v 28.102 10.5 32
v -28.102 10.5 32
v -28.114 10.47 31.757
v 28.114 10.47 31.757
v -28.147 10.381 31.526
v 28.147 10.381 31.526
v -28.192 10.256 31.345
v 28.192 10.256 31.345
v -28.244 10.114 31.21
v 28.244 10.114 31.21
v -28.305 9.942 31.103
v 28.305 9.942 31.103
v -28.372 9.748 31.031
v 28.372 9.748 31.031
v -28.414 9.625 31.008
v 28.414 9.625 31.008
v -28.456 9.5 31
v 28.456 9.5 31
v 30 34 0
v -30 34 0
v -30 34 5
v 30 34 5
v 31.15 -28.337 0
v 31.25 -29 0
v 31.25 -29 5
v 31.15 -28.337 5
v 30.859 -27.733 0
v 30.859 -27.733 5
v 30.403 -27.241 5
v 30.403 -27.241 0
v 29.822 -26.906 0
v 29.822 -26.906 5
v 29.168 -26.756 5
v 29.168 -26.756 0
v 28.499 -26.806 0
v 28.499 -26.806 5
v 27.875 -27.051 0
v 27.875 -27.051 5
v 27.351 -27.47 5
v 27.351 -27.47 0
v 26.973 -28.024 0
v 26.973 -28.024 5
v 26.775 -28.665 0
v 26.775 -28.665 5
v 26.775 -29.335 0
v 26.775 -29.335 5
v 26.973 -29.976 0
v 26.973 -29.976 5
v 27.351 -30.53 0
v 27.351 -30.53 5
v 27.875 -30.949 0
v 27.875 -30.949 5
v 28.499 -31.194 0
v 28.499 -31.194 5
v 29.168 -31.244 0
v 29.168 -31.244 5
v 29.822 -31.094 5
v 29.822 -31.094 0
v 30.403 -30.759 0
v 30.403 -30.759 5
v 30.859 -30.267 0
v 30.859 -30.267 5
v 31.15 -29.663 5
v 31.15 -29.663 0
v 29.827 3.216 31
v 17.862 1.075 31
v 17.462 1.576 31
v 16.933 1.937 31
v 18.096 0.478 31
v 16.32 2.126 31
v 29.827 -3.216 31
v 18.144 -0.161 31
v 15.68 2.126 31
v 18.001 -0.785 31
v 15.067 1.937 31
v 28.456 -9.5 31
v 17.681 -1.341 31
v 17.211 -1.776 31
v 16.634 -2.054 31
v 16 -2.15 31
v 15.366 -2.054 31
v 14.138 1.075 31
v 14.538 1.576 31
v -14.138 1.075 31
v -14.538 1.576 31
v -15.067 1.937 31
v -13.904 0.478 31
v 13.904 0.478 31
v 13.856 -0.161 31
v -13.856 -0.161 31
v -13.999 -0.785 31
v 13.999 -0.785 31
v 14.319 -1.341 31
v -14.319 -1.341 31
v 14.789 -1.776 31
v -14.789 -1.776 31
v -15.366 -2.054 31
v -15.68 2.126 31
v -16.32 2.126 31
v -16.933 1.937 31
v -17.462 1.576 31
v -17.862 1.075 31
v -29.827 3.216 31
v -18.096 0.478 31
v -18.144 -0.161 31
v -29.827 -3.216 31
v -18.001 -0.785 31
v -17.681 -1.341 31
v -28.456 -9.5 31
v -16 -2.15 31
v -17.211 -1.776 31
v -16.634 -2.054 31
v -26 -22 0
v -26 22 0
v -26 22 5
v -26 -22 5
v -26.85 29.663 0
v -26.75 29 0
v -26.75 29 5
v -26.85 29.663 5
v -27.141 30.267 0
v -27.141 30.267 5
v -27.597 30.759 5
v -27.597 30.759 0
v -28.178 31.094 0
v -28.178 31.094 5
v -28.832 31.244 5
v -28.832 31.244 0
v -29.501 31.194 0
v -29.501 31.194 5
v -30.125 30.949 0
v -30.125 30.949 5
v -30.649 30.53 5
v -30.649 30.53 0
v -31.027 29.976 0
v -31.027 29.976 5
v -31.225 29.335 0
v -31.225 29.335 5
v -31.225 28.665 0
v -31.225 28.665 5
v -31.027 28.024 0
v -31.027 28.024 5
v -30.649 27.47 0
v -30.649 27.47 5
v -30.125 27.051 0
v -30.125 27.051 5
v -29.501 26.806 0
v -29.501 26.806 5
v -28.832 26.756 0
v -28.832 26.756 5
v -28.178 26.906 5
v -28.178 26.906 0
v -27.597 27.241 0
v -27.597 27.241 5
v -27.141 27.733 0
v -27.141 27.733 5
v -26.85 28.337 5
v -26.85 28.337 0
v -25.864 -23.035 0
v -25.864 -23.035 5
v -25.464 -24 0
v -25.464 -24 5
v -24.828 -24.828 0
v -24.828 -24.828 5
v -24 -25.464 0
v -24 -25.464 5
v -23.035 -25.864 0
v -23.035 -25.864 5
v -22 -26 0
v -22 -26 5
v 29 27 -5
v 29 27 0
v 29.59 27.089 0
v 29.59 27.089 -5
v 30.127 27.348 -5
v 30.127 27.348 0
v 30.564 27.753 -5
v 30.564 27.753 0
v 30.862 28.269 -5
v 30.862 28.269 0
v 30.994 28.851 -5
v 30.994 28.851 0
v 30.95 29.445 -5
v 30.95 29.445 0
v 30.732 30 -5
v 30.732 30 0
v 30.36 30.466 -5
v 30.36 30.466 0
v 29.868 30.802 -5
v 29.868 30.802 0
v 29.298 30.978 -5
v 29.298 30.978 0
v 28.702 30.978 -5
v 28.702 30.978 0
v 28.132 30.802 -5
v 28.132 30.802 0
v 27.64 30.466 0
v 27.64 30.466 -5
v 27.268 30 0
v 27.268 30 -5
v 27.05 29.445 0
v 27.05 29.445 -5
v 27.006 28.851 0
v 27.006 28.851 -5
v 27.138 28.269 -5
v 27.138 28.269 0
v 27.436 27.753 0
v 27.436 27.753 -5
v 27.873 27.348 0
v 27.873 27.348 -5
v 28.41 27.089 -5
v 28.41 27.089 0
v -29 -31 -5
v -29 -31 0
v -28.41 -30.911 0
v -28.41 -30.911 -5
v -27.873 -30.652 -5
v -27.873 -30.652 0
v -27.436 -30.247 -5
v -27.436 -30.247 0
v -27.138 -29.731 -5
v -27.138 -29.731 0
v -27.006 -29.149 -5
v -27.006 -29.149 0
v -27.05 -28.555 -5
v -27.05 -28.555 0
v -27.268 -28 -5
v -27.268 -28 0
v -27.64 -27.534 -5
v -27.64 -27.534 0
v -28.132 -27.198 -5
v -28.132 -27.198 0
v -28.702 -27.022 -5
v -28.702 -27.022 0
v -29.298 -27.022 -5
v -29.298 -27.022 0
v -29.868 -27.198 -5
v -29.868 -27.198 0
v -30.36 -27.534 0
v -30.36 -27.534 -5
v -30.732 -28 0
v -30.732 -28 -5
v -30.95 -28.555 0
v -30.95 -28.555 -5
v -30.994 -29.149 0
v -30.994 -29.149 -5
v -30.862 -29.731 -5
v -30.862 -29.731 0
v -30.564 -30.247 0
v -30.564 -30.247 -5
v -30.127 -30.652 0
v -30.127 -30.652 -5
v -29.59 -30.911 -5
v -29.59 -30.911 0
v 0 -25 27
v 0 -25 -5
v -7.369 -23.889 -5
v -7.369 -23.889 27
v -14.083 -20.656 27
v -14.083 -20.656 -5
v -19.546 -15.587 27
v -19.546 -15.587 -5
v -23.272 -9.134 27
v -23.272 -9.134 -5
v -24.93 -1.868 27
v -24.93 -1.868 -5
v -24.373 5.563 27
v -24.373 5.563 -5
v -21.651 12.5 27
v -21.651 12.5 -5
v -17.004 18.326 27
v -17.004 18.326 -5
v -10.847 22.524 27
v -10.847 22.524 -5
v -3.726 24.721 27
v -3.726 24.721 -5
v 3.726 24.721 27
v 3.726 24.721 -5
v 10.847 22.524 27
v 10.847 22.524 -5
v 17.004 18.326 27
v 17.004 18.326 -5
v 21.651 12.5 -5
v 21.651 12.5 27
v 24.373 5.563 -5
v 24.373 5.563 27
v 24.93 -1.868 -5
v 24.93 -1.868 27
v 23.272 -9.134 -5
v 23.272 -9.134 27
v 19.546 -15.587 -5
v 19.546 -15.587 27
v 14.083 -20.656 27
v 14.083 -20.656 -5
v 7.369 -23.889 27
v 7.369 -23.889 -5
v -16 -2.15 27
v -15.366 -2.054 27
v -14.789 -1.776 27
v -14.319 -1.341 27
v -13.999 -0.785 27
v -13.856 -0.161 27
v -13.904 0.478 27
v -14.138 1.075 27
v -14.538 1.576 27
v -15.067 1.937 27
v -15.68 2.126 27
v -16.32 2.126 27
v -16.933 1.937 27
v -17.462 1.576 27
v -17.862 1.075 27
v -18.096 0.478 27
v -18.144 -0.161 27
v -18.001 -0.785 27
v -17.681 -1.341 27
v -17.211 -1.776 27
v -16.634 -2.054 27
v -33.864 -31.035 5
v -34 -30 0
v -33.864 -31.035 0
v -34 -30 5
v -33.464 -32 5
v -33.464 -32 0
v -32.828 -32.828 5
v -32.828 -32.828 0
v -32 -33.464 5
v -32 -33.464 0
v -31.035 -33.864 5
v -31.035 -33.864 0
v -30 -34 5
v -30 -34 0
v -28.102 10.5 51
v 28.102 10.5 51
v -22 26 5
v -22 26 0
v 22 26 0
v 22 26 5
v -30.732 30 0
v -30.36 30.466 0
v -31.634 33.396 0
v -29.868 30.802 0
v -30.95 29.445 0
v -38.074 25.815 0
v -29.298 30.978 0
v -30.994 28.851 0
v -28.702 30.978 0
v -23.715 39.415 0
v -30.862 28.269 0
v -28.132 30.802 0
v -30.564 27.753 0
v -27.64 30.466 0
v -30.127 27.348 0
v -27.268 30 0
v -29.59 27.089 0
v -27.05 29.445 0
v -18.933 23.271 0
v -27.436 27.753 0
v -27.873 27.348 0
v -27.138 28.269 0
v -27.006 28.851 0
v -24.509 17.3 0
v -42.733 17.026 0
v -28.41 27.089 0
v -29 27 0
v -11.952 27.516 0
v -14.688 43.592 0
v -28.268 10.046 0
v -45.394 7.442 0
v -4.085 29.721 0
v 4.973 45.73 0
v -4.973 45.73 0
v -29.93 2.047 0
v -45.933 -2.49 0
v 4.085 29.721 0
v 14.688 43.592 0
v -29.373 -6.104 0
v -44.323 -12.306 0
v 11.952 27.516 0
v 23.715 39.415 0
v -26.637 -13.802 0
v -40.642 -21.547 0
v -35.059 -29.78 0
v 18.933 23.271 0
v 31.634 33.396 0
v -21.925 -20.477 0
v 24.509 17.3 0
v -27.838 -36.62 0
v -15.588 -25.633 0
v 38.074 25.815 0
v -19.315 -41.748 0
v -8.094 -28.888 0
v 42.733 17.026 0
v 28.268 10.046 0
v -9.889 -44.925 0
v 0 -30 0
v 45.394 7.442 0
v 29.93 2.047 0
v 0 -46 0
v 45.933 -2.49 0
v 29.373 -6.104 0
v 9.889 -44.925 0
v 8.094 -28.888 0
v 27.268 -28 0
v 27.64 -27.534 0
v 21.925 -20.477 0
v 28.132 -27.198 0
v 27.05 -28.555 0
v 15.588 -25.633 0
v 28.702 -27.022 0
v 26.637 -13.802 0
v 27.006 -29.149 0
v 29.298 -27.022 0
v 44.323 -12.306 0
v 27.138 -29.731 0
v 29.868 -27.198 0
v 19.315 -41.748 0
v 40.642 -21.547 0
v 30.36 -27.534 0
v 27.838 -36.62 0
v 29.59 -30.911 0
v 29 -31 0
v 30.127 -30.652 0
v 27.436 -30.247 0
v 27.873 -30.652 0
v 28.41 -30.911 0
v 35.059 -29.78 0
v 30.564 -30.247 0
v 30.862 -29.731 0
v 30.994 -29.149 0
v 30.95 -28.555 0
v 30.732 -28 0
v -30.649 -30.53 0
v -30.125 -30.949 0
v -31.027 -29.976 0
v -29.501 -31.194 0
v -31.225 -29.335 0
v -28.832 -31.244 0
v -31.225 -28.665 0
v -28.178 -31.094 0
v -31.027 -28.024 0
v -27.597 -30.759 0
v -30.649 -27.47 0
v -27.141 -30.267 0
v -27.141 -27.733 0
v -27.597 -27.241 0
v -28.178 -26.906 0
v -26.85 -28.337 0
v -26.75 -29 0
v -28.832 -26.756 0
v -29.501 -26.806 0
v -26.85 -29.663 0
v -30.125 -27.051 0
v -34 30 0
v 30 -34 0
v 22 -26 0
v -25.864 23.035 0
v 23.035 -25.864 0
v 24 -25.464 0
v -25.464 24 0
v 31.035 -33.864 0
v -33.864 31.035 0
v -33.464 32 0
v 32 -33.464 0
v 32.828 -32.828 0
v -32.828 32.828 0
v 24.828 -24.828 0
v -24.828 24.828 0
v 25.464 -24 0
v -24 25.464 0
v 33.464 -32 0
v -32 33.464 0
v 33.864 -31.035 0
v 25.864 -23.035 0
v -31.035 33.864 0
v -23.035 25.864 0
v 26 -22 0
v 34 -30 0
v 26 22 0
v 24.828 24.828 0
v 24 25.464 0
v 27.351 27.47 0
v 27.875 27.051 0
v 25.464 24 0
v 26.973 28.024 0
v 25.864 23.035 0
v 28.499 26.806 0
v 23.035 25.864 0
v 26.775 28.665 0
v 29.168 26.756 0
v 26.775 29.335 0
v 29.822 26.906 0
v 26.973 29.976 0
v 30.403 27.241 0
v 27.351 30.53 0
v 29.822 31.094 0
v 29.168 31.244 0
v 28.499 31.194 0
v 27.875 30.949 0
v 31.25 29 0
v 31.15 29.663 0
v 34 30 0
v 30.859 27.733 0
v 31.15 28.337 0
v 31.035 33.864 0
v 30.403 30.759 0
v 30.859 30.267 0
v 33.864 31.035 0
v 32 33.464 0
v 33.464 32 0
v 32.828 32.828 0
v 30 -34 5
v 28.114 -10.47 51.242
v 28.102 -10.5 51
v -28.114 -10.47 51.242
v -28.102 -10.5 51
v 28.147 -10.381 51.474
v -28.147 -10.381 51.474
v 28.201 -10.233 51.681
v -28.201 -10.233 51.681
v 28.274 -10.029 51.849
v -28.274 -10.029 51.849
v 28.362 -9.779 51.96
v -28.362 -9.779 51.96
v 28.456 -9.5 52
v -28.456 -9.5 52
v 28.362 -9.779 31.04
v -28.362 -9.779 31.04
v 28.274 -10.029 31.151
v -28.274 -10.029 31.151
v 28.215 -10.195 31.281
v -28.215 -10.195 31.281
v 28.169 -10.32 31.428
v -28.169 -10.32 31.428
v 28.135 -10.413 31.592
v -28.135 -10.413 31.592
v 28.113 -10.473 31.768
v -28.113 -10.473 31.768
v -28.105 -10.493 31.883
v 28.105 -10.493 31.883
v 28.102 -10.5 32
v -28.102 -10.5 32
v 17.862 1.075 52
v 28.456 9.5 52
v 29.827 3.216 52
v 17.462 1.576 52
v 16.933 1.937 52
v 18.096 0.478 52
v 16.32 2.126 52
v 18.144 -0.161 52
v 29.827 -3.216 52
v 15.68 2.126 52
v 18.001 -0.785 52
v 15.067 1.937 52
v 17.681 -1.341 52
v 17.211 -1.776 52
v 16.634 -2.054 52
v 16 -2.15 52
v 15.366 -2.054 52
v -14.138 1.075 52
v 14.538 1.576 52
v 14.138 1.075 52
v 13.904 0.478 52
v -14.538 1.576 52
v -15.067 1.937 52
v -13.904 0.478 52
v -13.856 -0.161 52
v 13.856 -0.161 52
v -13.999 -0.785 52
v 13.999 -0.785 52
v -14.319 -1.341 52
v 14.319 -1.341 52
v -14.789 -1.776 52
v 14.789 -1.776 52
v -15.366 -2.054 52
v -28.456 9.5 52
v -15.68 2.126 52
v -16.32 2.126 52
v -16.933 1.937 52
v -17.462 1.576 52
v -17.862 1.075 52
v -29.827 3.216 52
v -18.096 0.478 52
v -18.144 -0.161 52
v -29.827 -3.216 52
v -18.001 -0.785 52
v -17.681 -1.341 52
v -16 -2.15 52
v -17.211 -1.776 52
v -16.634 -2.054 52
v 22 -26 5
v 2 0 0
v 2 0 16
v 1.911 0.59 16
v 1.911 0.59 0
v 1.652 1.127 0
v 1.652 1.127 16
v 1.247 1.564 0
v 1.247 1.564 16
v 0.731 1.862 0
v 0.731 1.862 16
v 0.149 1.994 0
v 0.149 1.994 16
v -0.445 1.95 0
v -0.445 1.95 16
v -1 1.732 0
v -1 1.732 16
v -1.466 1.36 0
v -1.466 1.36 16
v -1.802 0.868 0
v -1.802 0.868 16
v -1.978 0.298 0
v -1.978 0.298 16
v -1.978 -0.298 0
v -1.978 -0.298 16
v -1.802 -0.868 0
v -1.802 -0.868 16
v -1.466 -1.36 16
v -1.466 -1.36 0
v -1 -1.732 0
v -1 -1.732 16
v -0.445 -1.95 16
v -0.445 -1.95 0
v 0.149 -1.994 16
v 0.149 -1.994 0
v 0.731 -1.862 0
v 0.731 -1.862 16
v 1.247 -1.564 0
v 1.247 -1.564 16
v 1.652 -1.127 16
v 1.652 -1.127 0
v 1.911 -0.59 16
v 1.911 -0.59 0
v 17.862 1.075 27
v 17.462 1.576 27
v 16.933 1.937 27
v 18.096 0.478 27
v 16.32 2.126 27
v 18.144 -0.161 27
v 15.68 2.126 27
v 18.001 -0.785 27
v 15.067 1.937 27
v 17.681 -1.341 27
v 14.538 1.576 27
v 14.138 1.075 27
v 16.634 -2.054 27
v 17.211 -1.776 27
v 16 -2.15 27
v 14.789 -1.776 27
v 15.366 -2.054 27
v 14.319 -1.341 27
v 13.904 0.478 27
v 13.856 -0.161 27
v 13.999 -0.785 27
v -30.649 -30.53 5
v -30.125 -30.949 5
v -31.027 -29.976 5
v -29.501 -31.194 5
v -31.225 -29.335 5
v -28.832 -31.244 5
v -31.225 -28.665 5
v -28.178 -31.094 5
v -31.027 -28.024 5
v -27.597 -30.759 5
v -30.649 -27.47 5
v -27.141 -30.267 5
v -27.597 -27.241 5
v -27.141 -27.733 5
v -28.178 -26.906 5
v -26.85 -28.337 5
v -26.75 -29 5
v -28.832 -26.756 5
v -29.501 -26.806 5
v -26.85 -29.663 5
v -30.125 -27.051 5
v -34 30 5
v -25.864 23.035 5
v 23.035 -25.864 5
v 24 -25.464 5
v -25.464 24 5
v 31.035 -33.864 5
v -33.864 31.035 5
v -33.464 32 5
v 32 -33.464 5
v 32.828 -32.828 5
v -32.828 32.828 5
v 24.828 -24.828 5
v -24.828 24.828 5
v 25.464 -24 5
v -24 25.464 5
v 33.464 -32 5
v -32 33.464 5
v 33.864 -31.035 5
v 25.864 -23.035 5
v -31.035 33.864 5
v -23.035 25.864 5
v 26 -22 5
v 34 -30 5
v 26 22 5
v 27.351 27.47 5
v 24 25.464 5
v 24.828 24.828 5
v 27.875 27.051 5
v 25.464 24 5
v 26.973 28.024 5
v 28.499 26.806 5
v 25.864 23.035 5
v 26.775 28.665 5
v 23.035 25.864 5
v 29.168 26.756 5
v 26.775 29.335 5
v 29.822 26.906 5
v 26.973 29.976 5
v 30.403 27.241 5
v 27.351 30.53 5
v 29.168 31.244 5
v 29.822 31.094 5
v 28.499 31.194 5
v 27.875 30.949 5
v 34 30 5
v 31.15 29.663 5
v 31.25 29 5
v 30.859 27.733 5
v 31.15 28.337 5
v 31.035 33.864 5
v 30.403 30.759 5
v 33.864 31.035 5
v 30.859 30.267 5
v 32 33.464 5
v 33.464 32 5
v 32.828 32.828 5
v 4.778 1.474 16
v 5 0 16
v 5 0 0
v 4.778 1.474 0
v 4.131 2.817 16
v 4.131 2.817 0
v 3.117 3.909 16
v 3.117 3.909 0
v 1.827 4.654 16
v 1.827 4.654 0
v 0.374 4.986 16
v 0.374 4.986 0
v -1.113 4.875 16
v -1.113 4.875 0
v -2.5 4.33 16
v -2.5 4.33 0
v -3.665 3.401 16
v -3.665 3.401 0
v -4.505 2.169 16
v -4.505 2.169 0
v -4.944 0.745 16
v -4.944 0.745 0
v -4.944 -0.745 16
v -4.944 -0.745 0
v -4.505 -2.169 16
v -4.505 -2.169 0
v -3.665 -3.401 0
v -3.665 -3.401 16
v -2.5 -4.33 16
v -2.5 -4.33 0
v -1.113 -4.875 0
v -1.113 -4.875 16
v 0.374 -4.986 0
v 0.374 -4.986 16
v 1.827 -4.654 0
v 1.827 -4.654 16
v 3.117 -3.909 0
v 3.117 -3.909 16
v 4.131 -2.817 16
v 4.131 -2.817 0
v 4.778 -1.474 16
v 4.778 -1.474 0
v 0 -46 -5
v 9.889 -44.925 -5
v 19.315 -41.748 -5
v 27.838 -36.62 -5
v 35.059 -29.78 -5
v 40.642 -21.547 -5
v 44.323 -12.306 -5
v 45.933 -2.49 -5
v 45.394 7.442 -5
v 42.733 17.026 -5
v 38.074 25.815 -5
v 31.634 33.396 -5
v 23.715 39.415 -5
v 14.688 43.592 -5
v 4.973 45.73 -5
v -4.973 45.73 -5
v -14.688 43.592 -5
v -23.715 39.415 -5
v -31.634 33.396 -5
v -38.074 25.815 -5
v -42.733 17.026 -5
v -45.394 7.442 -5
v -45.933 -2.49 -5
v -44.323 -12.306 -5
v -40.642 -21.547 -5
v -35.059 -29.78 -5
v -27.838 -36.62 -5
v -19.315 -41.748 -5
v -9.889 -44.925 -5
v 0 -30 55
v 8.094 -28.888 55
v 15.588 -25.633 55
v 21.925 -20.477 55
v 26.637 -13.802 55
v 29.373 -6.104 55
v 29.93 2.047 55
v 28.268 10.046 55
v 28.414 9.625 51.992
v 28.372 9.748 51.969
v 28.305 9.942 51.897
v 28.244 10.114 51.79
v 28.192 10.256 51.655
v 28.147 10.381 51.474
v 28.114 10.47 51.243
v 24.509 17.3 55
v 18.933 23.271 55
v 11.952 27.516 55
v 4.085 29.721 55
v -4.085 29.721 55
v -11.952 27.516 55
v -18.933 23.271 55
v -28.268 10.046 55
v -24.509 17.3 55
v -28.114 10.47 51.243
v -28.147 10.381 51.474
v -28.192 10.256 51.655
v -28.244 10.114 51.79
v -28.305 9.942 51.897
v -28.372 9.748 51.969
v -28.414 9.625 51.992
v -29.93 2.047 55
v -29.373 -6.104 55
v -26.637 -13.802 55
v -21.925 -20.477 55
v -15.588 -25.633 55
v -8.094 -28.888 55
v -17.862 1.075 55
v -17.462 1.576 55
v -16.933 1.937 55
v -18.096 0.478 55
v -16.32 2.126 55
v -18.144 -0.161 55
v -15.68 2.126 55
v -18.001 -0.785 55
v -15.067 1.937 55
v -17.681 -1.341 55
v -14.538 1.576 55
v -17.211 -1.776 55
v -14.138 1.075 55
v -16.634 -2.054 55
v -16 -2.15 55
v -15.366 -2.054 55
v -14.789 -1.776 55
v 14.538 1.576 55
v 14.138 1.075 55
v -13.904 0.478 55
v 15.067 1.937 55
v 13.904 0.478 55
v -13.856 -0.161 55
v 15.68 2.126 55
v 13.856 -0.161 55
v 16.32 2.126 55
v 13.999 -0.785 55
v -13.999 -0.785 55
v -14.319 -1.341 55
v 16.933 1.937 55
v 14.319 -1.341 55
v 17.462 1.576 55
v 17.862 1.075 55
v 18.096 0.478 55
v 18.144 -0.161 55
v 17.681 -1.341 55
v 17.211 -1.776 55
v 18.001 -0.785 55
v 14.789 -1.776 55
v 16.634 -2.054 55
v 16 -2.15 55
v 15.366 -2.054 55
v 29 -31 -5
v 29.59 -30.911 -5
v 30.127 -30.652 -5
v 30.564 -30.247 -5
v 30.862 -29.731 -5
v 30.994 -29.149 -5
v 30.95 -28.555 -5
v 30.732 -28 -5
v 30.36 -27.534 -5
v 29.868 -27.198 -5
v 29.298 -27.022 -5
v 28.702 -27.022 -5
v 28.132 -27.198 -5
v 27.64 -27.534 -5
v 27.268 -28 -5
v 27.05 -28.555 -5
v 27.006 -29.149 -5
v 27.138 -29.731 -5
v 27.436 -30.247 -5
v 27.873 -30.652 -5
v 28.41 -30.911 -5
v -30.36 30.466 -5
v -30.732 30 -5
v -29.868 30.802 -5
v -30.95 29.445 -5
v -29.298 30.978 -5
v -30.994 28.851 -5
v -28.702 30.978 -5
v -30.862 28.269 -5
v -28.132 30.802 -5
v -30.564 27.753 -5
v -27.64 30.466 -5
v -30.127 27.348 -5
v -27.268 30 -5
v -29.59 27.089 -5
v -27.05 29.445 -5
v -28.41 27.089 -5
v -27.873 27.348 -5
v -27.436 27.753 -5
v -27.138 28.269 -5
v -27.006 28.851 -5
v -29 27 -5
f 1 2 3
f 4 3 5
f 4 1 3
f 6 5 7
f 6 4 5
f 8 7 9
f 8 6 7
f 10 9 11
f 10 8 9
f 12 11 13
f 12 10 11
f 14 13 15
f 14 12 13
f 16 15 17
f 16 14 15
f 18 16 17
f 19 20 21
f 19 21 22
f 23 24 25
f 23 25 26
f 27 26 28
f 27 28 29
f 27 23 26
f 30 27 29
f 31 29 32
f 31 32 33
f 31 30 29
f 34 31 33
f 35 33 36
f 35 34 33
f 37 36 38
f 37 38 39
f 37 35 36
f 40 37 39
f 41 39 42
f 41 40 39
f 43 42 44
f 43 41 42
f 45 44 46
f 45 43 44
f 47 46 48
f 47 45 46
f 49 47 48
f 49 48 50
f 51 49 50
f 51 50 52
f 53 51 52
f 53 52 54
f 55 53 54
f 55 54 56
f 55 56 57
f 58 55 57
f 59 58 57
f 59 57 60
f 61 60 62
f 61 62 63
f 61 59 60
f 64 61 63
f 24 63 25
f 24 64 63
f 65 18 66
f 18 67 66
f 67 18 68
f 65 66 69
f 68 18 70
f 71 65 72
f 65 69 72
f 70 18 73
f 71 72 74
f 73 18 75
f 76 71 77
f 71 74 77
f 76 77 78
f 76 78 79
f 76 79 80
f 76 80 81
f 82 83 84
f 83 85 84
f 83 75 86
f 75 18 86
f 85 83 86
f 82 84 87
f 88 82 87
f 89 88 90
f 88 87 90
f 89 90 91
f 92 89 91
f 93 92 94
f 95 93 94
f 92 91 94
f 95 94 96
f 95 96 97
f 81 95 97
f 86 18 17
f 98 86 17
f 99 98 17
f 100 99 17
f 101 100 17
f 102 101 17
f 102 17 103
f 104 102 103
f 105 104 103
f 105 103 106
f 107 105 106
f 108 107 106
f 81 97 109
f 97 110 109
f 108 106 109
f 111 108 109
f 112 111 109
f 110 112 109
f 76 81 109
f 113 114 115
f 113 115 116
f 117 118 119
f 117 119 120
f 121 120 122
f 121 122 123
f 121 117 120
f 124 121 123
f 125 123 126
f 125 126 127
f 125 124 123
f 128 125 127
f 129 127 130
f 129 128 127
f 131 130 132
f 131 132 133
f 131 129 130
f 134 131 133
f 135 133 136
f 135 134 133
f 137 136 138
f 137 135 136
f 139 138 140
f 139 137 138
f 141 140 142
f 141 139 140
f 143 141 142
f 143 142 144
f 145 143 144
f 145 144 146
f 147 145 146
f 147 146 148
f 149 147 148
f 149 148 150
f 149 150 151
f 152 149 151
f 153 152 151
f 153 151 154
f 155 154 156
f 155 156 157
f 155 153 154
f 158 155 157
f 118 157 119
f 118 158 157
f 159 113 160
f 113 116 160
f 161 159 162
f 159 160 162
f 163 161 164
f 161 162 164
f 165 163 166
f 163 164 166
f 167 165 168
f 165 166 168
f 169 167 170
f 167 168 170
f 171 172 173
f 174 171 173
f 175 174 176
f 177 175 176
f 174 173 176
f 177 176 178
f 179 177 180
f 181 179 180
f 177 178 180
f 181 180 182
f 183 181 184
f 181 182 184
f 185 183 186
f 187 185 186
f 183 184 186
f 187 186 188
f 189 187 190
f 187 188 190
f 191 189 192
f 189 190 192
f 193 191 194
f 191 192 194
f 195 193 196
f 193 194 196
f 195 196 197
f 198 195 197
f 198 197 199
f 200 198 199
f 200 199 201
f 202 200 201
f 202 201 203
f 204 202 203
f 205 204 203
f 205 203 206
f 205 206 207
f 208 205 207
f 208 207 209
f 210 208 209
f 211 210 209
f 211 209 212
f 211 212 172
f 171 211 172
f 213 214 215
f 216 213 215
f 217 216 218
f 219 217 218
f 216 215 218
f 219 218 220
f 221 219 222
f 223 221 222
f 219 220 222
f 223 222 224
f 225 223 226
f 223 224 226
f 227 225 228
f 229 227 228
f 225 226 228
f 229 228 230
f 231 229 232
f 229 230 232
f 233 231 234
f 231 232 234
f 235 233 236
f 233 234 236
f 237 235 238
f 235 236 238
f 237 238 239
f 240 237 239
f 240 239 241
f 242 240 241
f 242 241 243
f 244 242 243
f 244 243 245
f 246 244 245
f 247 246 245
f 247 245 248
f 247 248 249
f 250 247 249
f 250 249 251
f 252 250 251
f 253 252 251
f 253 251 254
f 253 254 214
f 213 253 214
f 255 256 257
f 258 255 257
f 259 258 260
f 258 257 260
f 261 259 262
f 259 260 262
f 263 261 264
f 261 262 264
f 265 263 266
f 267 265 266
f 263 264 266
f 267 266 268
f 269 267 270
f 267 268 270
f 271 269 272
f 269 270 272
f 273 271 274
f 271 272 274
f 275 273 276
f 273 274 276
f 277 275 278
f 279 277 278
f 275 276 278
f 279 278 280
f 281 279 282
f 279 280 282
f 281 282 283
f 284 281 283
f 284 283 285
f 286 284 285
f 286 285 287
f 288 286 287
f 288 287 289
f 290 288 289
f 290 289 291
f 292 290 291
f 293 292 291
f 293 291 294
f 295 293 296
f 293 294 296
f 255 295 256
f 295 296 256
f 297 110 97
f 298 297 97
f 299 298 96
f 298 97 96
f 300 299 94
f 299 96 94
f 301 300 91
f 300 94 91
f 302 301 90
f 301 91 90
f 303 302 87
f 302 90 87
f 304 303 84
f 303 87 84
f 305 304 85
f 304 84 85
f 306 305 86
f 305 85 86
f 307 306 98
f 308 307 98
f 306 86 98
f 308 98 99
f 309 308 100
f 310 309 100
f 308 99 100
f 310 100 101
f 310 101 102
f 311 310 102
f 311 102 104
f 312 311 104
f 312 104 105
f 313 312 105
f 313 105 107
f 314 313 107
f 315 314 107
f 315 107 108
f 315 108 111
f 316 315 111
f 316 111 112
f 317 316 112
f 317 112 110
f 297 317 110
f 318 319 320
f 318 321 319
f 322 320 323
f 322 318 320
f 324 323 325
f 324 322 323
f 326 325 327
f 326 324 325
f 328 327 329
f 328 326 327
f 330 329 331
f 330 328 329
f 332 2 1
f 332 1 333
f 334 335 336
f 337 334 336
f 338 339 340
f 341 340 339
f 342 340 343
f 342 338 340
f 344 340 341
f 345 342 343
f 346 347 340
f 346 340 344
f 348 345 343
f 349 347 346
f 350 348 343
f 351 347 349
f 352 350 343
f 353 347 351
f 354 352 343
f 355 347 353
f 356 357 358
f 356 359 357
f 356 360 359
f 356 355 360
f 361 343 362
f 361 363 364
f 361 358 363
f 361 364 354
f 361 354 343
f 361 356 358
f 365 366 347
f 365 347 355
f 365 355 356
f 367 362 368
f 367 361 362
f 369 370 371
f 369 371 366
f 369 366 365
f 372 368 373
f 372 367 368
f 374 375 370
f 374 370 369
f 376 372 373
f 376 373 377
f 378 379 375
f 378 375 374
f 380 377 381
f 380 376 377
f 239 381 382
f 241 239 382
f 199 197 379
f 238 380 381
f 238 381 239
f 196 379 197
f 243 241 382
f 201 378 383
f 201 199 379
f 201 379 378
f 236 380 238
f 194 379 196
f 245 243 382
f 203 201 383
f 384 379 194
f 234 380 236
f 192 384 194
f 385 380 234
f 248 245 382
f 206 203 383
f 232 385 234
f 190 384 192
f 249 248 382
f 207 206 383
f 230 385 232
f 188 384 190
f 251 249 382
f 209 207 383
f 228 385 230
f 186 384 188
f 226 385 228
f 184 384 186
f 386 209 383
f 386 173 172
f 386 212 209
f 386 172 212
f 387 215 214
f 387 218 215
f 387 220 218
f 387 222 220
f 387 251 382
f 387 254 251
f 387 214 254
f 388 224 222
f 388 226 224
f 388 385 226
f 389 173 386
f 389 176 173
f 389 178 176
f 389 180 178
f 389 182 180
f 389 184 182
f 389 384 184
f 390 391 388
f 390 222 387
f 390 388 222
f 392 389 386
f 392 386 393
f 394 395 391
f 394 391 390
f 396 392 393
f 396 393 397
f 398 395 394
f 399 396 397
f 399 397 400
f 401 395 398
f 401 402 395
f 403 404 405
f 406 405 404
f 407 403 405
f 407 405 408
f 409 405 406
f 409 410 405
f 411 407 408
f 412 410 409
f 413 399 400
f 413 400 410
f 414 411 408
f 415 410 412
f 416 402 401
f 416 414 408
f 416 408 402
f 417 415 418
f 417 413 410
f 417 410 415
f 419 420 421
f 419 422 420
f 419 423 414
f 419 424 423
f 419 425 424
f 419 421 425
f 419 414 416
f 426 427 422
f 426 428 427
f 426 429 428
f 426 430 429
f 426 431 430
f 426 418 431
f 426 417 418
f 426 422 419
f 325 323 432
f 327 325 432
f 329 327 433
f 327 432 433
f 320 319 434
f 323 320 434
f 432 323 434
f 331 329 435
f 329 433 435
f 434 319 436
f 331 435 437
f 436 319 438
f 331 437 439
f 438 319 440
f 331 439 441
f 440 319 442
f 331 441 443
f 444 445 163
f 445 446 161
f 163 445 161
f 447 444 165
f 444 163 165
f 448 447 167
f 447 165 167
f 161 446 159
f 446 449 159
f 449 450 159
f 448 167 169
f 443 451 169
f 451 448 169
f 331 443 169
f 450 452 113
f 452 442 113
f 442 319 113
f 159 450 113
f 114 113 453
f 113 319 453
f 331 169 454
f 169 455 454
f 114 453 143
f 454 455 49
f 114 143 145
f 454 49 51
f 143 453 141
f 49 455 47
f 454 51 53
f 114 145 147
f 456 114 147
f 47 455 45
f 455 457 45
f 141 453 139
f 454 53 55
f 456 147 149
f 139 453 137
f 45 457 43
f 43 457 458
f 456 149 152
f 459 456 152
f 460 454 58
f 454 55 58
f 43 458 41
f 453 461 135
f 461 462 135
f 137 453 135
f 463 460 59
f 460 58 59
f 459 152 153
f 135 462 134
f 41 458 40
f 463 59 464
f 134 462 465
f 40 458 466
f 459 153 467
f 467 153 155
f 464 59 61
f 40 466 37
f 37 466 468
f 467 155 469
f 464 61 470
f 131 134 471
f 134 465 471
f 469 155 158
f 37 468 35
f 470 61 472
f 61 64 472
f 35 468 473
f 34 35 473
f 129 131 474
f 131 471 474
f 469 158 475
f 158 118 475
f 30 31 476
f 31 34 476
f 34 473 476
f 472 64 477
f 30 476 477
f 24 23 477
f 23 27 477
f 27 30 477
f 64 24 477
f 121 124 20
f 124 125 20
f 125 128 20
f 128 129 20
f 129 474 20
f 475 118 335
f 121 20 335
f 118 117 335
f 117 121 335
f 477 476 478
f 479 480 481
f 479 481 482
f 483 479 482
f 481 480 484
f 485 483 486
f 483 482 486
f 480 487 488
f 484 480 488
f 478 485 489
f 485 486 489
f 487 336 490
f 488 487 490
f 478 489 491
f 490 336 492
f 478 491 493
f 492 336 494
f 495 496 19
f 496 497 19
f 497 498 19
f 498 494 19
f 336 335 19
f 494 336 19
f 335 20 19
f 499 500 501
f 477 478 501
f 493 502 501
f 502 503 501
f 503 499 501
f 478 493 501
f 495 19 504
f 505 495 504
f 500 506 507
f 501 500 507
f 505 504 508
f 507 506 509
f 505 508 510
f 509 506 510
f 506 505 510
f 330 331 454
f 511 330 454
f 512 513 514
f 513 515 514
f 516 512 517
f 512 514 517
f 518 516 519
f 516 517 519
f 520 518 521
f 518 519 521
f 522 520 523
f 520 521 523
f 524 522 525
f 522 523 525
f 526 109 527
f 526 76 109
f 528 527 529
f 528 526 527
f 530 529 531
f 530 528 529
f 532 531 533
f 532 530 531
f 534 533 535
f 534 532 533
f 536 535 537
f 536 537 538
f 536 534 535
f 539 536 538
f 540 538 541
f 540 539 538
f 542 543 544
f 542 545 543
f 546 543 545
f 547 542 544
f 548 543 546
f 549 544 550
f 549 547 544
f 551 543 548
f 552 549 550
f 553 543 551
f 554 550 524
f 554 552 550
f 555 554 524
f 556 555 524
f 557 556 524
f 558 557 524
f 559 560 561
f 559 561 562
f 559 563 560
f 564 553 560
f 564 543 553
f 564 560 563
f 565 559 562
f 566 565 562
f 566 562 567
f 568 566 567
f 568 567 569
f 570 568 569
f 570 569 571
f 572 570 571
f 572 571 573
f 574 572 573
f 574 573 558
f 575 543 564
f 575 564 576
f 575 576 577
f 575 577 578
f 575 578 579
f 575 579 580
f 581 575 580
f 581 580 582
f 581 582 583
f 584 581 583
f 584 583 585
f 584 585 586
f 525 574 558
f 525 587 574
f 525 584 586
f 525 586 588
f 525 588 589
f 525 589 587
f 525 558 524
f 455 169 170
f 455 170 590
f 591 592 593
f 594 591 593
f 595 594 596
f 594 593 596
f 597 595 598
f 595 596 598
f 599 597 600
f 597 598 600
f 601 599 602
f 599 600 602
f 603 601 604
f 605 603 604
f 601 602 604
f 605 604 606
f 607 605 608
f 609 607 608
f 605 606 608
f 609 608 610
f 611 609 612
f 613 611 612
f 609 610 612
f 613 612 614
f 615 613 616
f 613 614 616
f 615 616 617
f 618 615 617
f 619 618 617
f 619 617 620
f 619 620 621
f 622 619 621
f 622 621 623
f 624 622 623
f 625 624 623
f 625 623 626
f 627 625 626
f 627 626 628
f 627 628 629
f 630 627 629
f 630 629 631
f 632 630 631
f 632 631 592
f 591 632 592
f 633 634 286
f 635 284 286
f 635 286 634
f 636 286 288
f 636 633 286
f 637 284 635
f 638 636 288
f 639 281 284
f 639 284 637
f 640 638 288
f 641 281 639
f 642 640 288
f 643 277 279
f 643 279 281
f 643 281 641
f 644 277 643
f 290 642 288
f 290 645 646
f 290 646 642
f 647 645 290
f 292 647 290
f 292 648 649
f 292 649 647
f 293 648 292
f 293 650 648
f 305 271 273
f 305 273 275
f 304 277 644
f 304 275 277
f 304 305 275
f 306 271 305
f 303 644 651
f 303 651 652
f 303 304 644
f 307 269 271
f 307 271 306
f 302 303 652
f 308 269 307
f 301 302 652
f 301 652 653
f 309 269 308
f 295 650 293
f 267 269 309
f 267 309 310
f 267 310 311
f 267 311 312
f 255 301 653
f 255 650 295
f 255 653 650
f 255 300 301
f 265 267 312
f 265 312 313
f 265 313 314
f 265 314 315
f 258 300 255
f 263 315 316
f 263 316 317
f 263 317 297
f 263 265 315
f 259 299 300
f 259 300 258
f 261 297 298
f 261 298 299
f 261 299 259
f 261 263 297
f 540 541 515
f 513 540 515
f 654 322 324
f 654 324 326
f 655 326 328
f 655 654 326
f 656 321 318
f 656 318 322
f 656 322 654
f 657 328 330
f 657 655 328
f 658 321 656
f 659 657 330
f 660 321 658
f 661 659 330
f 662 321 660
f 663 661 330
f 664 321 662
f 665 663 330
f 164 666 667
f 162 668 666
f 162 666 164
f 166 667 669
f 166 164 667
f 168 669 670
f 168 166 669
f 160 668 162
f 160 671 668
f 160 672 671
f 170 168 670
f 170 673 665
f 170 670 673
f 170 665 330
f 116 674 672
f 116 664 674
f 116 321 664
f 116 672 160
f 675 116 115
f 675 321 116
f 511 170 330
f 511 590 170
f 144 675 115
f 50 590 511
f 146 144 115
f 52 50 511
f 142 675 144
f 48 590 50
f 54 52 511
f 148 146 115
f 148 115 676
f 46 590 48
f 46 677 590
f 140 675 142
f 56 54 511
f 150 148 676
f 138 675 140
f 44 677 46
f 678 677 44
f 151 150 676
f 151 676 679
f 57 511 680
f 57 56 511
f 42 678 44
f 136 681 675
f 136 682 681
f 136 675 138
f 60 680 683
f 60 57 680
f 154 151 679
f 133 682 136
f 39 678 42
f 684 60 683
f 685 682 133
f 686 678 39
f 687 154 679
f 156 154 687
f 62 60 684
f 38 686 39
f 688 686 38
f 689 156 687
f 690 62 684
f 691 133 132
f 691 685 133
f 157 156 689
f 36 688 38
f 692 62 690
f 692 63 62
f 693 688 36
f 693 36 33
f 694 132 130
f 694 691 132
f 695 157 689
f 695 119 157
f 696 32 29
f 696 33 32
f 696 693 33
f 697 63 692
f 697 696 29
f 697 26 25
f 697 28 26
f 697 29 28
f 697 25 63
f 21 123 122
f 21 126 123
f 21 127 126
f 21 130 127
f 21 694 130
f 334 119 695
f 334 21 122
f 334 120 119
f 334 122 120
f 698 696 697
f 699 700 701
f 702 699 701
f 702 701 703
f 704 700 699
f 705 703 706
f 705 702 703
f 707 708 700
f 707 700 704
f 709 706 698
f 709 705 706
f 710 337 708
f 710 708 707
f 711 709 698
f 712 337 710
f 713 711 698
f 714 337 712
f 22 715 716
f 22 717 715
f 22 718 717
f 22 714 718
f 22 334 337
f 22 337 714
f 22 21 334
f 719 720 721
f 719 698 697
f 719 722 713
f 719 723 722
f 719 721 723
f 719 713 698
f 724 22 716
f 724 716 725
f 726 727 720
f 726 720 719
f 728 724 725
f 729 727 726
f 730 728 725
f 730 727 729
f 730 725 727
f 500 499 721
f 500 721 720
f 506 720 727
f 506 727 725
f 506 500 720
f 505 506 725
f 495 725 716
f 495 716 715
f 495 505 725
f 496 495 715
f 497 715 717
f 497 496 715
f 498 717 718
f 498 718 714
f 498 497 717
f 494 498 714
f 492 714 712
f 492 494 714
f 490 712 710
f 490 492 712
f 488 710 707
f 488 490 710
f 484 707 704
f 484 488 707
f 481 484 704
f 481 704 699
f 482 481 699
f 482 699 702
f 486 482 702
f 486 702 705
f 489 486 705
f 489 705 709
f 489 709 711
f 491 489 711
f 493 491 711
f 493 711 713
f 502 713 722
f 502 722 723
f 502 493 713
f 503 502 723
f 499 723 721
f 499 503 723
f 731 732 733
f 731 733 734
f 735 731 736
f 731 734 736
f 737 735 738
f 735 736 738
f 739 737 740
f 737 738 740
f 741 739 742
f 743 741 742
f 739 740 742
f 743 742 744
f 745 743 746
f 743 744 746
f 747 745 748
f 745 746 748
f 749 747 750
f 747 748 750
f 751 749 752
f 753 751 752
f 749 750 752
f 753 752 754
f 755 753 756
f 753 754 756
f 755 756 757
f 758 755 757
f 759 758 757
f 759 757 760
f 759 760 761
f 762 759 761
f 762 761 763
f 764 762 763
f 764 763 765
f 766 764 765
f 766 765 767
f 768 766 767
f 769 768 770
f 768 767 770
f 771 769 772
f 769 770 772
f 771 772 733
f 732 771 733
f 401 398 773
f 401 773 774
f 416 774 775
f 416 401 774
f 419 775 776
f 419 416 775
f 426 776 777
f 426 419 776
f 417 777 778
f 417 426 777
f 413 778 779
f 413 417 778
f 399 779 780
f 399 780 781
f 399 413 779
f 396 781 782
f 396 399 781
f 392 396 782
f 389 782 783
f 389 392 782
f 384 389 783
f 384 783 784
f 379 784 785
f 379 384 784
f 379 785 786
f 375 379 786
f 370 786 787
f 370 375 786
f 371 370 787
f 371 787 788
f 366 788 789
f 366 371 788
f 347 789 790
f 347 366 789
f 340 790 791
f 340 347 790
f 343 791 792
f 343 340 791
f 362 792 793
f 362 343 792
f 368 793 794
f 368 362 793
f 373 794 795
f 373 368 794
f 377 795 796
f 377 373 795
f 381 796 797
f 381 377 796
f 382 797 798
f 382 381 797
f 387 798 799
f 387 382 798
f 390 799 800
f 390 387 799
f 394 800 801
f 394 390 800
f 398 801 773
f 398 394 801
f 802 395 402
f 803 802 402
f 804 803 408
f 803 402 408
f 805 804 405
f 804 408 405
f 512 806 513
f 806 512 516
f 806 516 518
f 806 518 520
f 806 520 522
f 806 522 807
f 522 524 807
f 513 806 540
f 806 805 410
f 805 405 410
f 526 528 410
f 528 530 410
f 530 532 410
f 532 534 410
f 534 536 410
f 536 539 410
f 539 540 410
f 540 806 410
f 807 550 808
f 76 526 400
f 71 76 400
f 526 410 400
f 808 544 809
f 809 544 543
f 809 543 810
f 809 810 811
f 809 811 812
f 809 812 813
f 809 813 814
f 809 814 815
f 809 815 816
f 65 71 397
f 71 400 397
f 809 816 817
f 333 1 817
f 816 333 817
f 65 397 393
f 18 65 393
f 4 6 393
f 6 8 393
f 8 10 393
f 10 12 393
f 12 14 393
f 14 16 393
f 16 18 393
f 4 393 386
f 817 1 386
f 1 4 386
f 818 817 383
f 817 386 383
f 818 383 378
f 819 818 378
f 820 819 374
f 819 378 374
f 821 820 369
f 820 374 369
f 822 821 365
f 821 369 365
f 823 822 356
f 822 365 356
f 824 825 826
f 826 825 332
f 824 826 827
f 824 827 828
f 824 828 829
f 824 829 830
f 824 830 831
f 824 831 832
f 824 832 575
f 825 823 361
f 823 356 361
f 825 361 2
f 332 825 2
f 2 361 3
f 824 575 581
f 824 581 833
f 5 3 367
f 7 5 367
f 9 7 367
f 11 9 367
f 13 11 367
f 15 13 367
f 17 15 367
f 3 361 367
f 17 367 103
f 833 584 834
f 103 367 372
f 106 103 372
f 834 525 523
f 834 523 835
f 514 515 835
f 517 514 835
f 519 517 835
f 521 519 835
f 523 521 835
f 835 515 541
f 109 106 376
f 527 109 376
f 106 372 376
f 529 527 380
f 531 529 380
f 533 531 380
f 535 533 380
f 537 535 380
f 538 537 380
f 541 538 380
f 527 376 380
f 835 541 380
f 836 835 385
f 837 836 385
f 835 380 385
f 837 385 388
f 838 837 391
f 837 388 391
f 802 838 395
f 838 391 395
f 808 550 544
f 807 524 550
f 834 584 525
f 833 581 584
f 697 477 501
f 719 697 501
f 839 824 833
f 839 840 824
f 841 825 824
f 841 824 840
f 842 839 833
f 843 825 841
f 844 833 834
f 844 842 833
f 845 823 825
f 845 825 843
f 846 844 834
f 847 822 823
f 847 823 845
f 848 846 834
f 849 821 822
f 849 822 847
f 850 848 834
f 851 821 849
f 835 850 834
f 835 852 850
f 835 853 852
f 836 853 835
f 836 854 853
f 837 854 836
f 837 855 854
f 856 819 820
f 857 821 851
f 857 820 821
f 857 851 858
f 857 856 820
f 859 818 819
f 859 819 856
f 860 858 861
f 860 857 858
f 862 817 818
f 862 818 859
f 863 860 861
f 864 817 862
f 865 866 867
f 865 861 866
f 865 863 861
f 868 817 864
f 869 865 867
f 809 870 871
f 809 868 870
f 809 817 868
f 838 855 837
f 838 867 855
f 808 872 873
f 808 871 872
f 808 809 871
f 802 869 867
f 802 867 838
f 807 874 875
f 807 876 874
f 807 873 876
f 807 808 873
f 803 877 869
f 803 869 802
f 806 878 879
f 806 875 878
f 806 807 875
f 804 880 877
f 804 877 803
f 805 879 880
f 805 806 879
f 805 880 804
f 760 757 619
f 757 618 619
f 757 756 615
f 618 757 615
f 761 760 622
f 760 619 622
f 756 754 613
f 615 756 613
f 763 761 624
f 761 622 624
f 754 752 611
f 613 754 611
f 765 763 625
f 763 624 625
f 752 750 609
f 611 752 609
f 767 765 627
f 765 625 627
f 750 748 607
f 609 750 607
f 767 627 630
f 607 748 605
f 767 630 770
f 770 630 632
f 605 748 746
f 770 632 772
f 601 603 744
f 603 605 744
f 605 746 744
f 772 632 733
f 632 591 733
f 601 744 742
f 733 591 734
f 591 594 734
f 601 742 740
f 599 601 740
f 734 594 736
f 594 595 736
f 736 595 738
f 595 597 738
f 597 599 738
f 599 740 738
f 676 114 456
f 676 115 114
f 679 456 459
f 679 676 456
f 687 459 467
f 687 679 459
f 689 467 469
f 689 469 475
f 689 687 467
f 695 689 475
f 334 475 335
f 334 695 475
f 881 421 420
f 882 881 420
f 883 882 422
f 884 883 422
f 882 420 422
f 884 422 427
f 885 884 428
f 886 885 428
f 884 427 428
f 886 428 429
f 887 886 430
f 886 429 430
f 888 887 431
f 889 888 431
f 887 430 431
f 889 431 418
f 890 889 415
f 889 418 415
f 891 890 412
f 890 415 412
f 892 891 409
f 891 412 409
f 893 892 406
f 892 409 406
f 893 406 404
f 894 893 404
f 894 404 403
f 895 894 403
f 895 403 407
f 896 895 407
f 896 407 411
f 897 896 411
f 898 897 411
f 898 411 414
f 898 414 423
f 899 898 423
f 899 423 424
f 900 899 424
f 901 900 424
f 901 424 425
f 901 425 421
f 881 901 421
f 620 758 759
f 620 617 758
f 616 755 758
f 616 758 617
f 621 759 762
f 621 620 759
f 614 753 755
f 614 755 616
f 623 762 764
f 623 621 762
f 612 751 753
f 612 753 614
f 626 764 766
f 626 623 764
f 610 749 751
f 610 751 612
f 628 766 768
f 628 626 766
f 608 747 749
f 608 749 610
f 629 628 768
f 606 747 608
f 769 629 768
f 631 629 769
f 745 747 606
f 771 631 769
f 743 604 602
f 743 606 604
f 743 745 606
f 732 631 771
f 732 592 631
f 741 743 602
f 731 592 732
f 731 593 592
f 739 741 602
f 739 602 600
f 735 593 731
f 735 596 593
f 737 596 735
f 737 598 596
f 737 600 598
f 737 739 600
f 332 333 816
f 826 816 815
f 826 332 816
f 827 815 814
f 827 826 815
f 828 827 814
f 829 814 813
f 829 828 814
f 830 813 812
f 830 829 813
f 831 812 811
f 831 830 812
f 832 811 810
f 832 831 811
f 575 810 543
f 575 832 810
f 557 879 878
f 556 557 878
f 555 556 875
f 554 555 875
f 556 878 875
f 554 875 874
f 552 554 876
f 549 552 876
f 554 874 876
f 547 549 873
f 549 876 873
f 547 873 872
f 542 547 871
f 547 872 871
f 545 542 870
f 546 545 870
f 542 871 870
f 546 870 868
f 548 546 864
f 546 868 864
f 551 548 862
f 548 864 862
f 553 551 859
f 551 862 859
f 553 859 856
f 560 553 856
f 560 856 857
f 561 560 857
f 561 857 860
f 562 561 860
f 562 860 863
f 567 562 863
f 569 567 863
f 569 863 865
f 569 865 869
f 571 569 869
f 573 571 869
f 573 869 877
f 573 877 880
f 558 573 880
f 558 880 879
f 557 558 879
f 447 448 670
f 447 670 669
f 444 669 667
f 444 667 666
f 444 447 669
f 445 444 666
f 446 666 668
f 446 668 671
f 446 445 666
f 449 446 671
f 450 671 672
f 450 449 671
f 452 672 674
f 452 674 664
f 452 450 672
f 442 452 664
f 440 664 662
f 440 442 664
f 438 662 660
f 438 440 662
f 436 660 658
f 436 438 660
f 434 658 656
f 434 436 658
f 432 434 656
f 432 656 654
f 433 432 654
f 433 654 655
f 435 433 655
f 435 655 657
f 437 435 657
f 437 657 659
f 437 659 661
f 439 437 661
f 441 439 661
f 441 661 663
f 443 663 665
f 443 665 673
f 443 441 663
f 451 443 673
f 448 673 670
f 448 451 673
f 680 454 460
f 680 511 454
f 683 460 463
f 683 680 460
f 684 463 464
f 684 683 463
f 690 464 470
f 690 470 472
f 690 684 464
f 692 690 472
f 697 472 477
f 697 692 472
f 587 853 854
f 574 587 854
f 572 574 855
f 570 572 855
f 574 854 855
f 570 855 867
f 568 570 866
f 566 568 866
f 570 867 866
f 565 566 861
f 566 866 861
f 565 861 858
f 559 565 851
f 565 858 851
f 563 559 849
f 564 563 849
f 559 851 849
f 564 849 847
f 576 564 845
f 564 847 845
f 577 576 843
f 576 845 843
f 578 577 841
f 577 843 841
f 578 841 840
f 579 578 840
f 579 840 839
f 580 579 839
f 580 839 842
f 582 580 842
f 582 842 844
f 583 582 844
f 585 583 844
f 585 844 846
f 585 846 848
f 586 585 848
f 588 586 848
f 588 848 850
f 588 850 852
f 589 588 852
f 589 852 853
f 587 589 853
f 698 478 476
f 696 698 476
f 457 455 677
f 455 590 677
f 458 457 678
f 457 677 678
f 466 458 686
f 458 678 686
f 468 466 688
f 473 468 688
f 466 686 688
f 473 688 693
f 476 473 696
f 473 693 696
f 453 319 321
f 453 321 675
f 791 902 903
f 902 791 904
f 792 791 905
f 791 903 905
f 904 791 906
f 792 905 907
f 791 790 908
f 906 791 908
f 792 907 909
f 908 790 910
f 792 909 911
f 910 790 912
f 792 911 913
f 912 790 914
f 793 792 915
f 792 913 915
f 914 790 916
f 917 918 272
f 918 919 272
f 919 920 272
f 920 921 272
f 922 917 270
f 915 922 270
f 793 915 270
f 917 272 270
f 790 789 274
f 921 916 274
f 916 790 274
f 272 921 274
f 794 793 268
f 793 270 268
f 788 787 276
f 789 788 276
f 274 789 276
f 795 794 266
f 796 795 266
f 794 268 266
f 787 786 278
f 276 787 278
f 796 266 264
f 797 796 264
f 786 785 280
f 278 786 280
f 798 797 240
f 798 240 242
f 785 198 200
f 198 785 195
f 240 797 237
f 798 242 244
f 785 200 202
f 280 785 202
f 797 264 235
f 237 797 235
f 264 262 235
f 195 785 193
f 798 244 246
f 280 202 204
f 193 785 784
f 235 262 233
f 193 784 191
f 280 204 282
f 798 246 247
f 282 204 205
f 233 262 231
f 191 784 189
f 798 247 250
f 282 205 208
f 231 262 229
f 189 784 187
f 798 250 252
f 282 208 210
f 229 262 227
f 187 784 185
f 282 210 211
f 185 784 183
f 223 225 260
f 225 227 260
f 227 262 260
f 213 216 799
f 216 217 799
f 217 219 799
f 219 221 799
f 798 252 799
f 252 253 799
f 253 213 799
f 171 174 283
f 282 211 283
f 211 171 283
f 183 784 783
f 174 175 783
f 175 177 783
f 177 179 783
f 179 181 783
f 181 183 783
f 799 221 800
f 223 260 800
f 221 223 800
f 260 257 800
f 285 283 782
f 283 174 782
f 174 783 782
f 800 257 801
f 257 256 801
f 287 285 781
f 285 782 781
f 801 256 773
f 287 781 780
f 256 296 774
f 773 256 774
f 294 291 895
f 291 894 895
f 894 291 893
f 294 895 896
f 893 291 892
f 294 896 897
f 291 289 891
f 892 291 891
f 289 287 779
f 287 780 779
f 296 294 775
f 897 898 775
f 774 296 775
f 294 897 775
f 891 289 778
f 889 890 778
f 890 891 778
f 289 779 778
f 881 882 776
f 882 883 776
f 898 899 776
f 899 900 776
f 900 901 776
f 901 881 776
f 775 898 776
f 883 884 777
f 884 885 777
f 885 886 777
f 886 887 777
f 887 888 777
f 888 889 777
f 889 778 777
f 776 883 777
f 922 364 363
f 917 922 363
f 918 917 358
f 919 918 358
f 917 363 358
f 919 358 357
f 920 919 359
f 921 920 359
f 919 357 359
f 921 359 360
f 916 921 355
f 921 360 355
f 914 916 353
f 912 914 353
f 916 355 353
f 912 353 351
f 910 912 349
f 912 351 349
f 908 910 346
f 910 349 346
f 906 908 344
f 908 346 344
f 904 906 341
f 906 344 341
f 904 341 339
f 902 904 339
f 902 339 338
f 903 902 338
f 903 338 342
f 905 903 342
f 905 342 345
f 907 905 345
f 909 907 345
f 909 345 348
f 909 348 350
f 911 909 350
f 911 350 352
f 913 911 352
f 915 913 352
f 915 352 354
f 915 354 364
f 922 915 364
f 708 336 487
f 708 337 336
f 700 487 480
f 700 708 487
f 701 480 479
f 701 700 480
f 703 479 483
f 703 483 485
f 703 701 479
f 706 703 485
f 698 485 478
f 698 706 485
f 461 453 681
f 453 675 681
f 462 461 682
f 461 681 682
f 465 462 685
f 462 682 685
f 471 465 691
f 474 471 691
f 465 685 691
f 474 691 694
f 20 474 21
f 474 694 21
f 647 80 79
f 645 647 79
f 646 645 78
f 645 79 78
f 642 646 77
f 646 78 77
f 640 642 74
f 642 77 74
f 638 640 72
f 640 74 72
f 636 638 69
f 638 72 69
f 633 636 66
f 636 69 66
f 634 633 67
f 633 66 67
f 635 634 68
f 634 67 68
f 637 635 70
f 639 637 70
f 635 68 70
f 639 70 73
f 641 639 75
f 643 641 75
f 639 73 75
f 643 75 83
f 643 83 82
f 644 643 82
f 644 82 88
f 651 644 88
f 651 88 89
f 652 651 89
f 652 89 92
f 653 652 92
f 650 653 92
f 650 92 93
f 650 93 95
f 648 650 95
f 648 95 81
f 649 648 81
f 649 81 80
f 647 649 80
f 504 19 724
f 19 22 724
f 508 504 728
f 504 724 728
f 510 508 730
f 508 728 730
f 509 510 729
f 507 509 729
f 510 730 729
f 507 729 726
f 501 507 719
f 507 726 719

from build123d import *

# Parameters (mm, degrees)
SKETCH001_R          = 46
PAD_DEPTH            = 5
SKETCH_R             = 2
POCKET_DEPTH         = 5.001
SKETCH003_R          = 30
PAD002_DEPTH         = 55
SKETCH011_W          = 21
SKETCH011_H          = 21
POCKET004_DEPTH      = 46.001
POCKET004_DEPTH_BACK = -46.001
SKETCH012_R          = 25
POCKET005_DEPTH      = 32
SKETCH013_R          = 2.15
POCKET006_DEPTH      = 60.001
FILLET008_R          = 1
FILLET009_R          = 1
FILLET010_R          = 1
FILLET011_R          = 1
BODY_PLACEMENT_ANGLE = 90
SKETCH007_R          = 5
PAD004_DEPTH         = 16
SKETCH008_R          = 2
POCKET002_DEPTH      = 16.001
SKETCH009_W          = 68
SKETCH009_H          = 68
SKETCH009_R          = 2.25
PAD005_DEPTH         = 5
SKETCH010_W          = 52
SKETCH010_H          = 52
POCKET003_DEPTH      = 5.001
FILLET_R             = 4
FILLET001_R          = 4
FILLET002_R          = 4
FILLET003_R          = 4
FILLET004_R          = 4
FILLET005_R          = 4
FILLET006_R          = 4
FILLET007_R          = 4


with BuildPart() as body:
    # Sketch001 → Pad (new body)
    with BuildSketch(Plane.XY):
        Circle(SKETCH001_R)
    extrude(amount=-PAD_DEPTH)

    # Sketch → Pocket (cut, through all)
    with BuildSketch(Plane.XY):
        with Locations((-29, 29)):
            Circle(SKETCH_R)
        with Locations((29, 29)):
            Circle(SKETCH_R)
        with Locations((-29, -29)):
            Circle(SKETCH_R)
        with Locations((29, -29)):
            Circle(SKETCH_R)
    extrude(amount=-POCKET_DEPTH, mode=Mode.SUBTRACT)

    # Sketch003 → Pad002 (join)
    with BuildSketch(Plane.XY):
        Circle(SKETCH003_R)
    extrude(amount=PAD002_DEPTH)

    # Sketch011 → Pocket004 (cut, two sides)
    with BuildSketch(Plane.XZ) as pocket004_sk:
        with Locations((0, 41.5)):
            Rectangle(SKETCH011_W, SKETCH011_H)
    extrude(amount=-POCKET004_DEPTH, mode=Mode.SUBTRACT)
    extrude(pocket004_sk.sketch, amount=-POCKET004_DEPTH_BACK, mode=Mode.SUBTRACT)

    # Sketch012 (on Face3 of Pocket004) → Pocket005 (cut)
    with BuildSketch(Plane(origin=(0, 0, -5), x_dir=(1, 0, 0), z_dir=(0, 0, -1))):
        Circle(SKETCH012_R)
    extrude(amount=-POCKET005_DEPTH, mode=Mode.SUBTRACT)

    # Sketch013 (on Face10 of Pocket005) → Pocket006 (cut, through all)
    with BuildSketch(Plane.XY.offset(55)):
        with Locations((0, -16)):
            Circle(SKETCH013_R)
        with Locations((0, 16)):
            Circle(SKETCH013_R)
    extrude(amount=-POCKET006_DEPTH, mode=Mode.SUBTRACT)

    # Fillet008
    fillet008_edges = [body.edges().sort_by_distance(p)[0] for p in [
        (-10.5, 0, 31),
    ]]
    fillet(fillet008_edges, radius=FILLET008_R)

    # Fillet009
    fillet009_edges = [body.edges().sort_by_distance(p)[0] for p in [
        (-10.5, 0, 52),
    ]]
    fillet(fillet009_edges, radius=FILLET009_R)

    # Fillet010
    fillet010_edges = [body.edges().sort_by_distance(p)[0] for p in [
        (10.5, 0, 31),
    ]]
    fillet(fillet010_edges, radius=FILLET010_R)

    # Fillet011
    fillet011_edges = [body.edges().sort_by_distance(p)[0] for p in [
        (10.5, 0, 52),
    ]]
    fillet(fillet011_edges, radius=FILLET011_R)


with BuildPart() as body_1:
    # Body placement: moved
    add(body.part.rotate(Axis((0, 0, 0), (0, 0, -1)), BODY_PLACEMENT_ANGLE))


with BuildPart() as bodysupport:
    # Sketch007 → Pad004 (new body)
    with BuildSketch(Plane.XY):
        Circle(SKETCH007_R)
    extrude(amount=PAD004_DEPTH)

    # Sketch008 (on Face3 of Pad004) → Pocket002 (cut, through all)
    with BuildSketch(Plane.XY.offset(16)):
        Circle(SKETCH008_R)
    extrude(amount=-POCKET002_DEPTH, mode=Mode.SUBTRACT)


with BuildPart() as bodydrill:
    # Sketch009 → Pad005 (new body)
    with BuildSketch(Plane.XY):
        Rectangle(SKETCH009_W, SKETCH009_H)
        with Locations((-29, 29)):
            Circle(SKETCH009_R, mode=Mode.SUBTRACT)
        with Locations((29, 29)):
            Circle(SKETCH009_R, mode=Mode.SUBTRACT)
        with Locations((-29, -29)):
            Circle(SKETCH009_R, mode=Mode.SUBTRACT)
        with Locations((29, -29)):
            Circle(SKETCH009_R, mode=Mode.SUBTRACT)
    extrude(amount=PAD005_DEPTH)

    # Sketch010 (on Face9 of Pad005) → Pocket003 (cut, through all)
    with BuildSketch(Plane(origin=(0, 0, 0), x_dir=(1, 0, 0), z_dir=(0, 0, -1))):
        Rectangle(SKETCH010_W, SKETCH010_H)
    extrude(amount=-POCKET003_DEPTH, mode=Mode.SUBTRACT)

    # Fillet
    fillet_edges = [bodydrill.edges().sort_by_distance(p)[0] for p in [
        (-34, -34, 2.5),
    ]]
    fillet(fillet_edges, radius=FILLET_R)

    # Fillet001
    fillet001_edges = [bodydrill.edges().sort_by_distance(p)[0] for p in [
        (34, -34, 2.5),
    ]]
    fillet(fillet001_edges, radius=FILLET001_R)

    # Fillet002
    fillet002_edges = [bodydrill.edges().sort_by_distance(p)[0] for p in [
        (-34, 34, 2.5),
    ]]
    fillet(fillet002_edges, radius=FILLET002_R)

    # Fillet003
    fillet003_edges = [bodydrill.edges().sort_by_distance(p)[0] for p in [
        (34, 34, 2.5),
    ]]
    fillet(fillet003_edges, radius=FILLET003_R)

    # Fillet004
    fillet004_edges = [bodydrill.edges().sort_by_distance(p)[0] for p in [
        (-26, -26, 2.5),
    ]]
    fillet(fillet004_edges, radius=FILLET004_R)

    # Fillet005
    fillet005_edges = [bodydrill.edges().sort_by_distance(p)[0] for p in [
        (26, -26, 2.5),
    ]]
    fillet(fillet005_edges, radius=FILLET005_R)

    # Fillet006
    fillet006_edges = [bodydrill.edges().sort_by_distance(p)[0] for p in [
        (-26, 26, 2.5),
    ]]
    fillet(fillet006_edges, radius=FILLET006_R)

    # Fillet007
    fillet007_edges = [bodydrill.edges().sort_by_distance(p)[0] for p in [
        (26, 26, 2.5),
    ]]
    fillet(fillet007_edges, radius=FILLET007_R)


solid = Compound([body_1.part, bodysupport.part, bodydrill.part])
